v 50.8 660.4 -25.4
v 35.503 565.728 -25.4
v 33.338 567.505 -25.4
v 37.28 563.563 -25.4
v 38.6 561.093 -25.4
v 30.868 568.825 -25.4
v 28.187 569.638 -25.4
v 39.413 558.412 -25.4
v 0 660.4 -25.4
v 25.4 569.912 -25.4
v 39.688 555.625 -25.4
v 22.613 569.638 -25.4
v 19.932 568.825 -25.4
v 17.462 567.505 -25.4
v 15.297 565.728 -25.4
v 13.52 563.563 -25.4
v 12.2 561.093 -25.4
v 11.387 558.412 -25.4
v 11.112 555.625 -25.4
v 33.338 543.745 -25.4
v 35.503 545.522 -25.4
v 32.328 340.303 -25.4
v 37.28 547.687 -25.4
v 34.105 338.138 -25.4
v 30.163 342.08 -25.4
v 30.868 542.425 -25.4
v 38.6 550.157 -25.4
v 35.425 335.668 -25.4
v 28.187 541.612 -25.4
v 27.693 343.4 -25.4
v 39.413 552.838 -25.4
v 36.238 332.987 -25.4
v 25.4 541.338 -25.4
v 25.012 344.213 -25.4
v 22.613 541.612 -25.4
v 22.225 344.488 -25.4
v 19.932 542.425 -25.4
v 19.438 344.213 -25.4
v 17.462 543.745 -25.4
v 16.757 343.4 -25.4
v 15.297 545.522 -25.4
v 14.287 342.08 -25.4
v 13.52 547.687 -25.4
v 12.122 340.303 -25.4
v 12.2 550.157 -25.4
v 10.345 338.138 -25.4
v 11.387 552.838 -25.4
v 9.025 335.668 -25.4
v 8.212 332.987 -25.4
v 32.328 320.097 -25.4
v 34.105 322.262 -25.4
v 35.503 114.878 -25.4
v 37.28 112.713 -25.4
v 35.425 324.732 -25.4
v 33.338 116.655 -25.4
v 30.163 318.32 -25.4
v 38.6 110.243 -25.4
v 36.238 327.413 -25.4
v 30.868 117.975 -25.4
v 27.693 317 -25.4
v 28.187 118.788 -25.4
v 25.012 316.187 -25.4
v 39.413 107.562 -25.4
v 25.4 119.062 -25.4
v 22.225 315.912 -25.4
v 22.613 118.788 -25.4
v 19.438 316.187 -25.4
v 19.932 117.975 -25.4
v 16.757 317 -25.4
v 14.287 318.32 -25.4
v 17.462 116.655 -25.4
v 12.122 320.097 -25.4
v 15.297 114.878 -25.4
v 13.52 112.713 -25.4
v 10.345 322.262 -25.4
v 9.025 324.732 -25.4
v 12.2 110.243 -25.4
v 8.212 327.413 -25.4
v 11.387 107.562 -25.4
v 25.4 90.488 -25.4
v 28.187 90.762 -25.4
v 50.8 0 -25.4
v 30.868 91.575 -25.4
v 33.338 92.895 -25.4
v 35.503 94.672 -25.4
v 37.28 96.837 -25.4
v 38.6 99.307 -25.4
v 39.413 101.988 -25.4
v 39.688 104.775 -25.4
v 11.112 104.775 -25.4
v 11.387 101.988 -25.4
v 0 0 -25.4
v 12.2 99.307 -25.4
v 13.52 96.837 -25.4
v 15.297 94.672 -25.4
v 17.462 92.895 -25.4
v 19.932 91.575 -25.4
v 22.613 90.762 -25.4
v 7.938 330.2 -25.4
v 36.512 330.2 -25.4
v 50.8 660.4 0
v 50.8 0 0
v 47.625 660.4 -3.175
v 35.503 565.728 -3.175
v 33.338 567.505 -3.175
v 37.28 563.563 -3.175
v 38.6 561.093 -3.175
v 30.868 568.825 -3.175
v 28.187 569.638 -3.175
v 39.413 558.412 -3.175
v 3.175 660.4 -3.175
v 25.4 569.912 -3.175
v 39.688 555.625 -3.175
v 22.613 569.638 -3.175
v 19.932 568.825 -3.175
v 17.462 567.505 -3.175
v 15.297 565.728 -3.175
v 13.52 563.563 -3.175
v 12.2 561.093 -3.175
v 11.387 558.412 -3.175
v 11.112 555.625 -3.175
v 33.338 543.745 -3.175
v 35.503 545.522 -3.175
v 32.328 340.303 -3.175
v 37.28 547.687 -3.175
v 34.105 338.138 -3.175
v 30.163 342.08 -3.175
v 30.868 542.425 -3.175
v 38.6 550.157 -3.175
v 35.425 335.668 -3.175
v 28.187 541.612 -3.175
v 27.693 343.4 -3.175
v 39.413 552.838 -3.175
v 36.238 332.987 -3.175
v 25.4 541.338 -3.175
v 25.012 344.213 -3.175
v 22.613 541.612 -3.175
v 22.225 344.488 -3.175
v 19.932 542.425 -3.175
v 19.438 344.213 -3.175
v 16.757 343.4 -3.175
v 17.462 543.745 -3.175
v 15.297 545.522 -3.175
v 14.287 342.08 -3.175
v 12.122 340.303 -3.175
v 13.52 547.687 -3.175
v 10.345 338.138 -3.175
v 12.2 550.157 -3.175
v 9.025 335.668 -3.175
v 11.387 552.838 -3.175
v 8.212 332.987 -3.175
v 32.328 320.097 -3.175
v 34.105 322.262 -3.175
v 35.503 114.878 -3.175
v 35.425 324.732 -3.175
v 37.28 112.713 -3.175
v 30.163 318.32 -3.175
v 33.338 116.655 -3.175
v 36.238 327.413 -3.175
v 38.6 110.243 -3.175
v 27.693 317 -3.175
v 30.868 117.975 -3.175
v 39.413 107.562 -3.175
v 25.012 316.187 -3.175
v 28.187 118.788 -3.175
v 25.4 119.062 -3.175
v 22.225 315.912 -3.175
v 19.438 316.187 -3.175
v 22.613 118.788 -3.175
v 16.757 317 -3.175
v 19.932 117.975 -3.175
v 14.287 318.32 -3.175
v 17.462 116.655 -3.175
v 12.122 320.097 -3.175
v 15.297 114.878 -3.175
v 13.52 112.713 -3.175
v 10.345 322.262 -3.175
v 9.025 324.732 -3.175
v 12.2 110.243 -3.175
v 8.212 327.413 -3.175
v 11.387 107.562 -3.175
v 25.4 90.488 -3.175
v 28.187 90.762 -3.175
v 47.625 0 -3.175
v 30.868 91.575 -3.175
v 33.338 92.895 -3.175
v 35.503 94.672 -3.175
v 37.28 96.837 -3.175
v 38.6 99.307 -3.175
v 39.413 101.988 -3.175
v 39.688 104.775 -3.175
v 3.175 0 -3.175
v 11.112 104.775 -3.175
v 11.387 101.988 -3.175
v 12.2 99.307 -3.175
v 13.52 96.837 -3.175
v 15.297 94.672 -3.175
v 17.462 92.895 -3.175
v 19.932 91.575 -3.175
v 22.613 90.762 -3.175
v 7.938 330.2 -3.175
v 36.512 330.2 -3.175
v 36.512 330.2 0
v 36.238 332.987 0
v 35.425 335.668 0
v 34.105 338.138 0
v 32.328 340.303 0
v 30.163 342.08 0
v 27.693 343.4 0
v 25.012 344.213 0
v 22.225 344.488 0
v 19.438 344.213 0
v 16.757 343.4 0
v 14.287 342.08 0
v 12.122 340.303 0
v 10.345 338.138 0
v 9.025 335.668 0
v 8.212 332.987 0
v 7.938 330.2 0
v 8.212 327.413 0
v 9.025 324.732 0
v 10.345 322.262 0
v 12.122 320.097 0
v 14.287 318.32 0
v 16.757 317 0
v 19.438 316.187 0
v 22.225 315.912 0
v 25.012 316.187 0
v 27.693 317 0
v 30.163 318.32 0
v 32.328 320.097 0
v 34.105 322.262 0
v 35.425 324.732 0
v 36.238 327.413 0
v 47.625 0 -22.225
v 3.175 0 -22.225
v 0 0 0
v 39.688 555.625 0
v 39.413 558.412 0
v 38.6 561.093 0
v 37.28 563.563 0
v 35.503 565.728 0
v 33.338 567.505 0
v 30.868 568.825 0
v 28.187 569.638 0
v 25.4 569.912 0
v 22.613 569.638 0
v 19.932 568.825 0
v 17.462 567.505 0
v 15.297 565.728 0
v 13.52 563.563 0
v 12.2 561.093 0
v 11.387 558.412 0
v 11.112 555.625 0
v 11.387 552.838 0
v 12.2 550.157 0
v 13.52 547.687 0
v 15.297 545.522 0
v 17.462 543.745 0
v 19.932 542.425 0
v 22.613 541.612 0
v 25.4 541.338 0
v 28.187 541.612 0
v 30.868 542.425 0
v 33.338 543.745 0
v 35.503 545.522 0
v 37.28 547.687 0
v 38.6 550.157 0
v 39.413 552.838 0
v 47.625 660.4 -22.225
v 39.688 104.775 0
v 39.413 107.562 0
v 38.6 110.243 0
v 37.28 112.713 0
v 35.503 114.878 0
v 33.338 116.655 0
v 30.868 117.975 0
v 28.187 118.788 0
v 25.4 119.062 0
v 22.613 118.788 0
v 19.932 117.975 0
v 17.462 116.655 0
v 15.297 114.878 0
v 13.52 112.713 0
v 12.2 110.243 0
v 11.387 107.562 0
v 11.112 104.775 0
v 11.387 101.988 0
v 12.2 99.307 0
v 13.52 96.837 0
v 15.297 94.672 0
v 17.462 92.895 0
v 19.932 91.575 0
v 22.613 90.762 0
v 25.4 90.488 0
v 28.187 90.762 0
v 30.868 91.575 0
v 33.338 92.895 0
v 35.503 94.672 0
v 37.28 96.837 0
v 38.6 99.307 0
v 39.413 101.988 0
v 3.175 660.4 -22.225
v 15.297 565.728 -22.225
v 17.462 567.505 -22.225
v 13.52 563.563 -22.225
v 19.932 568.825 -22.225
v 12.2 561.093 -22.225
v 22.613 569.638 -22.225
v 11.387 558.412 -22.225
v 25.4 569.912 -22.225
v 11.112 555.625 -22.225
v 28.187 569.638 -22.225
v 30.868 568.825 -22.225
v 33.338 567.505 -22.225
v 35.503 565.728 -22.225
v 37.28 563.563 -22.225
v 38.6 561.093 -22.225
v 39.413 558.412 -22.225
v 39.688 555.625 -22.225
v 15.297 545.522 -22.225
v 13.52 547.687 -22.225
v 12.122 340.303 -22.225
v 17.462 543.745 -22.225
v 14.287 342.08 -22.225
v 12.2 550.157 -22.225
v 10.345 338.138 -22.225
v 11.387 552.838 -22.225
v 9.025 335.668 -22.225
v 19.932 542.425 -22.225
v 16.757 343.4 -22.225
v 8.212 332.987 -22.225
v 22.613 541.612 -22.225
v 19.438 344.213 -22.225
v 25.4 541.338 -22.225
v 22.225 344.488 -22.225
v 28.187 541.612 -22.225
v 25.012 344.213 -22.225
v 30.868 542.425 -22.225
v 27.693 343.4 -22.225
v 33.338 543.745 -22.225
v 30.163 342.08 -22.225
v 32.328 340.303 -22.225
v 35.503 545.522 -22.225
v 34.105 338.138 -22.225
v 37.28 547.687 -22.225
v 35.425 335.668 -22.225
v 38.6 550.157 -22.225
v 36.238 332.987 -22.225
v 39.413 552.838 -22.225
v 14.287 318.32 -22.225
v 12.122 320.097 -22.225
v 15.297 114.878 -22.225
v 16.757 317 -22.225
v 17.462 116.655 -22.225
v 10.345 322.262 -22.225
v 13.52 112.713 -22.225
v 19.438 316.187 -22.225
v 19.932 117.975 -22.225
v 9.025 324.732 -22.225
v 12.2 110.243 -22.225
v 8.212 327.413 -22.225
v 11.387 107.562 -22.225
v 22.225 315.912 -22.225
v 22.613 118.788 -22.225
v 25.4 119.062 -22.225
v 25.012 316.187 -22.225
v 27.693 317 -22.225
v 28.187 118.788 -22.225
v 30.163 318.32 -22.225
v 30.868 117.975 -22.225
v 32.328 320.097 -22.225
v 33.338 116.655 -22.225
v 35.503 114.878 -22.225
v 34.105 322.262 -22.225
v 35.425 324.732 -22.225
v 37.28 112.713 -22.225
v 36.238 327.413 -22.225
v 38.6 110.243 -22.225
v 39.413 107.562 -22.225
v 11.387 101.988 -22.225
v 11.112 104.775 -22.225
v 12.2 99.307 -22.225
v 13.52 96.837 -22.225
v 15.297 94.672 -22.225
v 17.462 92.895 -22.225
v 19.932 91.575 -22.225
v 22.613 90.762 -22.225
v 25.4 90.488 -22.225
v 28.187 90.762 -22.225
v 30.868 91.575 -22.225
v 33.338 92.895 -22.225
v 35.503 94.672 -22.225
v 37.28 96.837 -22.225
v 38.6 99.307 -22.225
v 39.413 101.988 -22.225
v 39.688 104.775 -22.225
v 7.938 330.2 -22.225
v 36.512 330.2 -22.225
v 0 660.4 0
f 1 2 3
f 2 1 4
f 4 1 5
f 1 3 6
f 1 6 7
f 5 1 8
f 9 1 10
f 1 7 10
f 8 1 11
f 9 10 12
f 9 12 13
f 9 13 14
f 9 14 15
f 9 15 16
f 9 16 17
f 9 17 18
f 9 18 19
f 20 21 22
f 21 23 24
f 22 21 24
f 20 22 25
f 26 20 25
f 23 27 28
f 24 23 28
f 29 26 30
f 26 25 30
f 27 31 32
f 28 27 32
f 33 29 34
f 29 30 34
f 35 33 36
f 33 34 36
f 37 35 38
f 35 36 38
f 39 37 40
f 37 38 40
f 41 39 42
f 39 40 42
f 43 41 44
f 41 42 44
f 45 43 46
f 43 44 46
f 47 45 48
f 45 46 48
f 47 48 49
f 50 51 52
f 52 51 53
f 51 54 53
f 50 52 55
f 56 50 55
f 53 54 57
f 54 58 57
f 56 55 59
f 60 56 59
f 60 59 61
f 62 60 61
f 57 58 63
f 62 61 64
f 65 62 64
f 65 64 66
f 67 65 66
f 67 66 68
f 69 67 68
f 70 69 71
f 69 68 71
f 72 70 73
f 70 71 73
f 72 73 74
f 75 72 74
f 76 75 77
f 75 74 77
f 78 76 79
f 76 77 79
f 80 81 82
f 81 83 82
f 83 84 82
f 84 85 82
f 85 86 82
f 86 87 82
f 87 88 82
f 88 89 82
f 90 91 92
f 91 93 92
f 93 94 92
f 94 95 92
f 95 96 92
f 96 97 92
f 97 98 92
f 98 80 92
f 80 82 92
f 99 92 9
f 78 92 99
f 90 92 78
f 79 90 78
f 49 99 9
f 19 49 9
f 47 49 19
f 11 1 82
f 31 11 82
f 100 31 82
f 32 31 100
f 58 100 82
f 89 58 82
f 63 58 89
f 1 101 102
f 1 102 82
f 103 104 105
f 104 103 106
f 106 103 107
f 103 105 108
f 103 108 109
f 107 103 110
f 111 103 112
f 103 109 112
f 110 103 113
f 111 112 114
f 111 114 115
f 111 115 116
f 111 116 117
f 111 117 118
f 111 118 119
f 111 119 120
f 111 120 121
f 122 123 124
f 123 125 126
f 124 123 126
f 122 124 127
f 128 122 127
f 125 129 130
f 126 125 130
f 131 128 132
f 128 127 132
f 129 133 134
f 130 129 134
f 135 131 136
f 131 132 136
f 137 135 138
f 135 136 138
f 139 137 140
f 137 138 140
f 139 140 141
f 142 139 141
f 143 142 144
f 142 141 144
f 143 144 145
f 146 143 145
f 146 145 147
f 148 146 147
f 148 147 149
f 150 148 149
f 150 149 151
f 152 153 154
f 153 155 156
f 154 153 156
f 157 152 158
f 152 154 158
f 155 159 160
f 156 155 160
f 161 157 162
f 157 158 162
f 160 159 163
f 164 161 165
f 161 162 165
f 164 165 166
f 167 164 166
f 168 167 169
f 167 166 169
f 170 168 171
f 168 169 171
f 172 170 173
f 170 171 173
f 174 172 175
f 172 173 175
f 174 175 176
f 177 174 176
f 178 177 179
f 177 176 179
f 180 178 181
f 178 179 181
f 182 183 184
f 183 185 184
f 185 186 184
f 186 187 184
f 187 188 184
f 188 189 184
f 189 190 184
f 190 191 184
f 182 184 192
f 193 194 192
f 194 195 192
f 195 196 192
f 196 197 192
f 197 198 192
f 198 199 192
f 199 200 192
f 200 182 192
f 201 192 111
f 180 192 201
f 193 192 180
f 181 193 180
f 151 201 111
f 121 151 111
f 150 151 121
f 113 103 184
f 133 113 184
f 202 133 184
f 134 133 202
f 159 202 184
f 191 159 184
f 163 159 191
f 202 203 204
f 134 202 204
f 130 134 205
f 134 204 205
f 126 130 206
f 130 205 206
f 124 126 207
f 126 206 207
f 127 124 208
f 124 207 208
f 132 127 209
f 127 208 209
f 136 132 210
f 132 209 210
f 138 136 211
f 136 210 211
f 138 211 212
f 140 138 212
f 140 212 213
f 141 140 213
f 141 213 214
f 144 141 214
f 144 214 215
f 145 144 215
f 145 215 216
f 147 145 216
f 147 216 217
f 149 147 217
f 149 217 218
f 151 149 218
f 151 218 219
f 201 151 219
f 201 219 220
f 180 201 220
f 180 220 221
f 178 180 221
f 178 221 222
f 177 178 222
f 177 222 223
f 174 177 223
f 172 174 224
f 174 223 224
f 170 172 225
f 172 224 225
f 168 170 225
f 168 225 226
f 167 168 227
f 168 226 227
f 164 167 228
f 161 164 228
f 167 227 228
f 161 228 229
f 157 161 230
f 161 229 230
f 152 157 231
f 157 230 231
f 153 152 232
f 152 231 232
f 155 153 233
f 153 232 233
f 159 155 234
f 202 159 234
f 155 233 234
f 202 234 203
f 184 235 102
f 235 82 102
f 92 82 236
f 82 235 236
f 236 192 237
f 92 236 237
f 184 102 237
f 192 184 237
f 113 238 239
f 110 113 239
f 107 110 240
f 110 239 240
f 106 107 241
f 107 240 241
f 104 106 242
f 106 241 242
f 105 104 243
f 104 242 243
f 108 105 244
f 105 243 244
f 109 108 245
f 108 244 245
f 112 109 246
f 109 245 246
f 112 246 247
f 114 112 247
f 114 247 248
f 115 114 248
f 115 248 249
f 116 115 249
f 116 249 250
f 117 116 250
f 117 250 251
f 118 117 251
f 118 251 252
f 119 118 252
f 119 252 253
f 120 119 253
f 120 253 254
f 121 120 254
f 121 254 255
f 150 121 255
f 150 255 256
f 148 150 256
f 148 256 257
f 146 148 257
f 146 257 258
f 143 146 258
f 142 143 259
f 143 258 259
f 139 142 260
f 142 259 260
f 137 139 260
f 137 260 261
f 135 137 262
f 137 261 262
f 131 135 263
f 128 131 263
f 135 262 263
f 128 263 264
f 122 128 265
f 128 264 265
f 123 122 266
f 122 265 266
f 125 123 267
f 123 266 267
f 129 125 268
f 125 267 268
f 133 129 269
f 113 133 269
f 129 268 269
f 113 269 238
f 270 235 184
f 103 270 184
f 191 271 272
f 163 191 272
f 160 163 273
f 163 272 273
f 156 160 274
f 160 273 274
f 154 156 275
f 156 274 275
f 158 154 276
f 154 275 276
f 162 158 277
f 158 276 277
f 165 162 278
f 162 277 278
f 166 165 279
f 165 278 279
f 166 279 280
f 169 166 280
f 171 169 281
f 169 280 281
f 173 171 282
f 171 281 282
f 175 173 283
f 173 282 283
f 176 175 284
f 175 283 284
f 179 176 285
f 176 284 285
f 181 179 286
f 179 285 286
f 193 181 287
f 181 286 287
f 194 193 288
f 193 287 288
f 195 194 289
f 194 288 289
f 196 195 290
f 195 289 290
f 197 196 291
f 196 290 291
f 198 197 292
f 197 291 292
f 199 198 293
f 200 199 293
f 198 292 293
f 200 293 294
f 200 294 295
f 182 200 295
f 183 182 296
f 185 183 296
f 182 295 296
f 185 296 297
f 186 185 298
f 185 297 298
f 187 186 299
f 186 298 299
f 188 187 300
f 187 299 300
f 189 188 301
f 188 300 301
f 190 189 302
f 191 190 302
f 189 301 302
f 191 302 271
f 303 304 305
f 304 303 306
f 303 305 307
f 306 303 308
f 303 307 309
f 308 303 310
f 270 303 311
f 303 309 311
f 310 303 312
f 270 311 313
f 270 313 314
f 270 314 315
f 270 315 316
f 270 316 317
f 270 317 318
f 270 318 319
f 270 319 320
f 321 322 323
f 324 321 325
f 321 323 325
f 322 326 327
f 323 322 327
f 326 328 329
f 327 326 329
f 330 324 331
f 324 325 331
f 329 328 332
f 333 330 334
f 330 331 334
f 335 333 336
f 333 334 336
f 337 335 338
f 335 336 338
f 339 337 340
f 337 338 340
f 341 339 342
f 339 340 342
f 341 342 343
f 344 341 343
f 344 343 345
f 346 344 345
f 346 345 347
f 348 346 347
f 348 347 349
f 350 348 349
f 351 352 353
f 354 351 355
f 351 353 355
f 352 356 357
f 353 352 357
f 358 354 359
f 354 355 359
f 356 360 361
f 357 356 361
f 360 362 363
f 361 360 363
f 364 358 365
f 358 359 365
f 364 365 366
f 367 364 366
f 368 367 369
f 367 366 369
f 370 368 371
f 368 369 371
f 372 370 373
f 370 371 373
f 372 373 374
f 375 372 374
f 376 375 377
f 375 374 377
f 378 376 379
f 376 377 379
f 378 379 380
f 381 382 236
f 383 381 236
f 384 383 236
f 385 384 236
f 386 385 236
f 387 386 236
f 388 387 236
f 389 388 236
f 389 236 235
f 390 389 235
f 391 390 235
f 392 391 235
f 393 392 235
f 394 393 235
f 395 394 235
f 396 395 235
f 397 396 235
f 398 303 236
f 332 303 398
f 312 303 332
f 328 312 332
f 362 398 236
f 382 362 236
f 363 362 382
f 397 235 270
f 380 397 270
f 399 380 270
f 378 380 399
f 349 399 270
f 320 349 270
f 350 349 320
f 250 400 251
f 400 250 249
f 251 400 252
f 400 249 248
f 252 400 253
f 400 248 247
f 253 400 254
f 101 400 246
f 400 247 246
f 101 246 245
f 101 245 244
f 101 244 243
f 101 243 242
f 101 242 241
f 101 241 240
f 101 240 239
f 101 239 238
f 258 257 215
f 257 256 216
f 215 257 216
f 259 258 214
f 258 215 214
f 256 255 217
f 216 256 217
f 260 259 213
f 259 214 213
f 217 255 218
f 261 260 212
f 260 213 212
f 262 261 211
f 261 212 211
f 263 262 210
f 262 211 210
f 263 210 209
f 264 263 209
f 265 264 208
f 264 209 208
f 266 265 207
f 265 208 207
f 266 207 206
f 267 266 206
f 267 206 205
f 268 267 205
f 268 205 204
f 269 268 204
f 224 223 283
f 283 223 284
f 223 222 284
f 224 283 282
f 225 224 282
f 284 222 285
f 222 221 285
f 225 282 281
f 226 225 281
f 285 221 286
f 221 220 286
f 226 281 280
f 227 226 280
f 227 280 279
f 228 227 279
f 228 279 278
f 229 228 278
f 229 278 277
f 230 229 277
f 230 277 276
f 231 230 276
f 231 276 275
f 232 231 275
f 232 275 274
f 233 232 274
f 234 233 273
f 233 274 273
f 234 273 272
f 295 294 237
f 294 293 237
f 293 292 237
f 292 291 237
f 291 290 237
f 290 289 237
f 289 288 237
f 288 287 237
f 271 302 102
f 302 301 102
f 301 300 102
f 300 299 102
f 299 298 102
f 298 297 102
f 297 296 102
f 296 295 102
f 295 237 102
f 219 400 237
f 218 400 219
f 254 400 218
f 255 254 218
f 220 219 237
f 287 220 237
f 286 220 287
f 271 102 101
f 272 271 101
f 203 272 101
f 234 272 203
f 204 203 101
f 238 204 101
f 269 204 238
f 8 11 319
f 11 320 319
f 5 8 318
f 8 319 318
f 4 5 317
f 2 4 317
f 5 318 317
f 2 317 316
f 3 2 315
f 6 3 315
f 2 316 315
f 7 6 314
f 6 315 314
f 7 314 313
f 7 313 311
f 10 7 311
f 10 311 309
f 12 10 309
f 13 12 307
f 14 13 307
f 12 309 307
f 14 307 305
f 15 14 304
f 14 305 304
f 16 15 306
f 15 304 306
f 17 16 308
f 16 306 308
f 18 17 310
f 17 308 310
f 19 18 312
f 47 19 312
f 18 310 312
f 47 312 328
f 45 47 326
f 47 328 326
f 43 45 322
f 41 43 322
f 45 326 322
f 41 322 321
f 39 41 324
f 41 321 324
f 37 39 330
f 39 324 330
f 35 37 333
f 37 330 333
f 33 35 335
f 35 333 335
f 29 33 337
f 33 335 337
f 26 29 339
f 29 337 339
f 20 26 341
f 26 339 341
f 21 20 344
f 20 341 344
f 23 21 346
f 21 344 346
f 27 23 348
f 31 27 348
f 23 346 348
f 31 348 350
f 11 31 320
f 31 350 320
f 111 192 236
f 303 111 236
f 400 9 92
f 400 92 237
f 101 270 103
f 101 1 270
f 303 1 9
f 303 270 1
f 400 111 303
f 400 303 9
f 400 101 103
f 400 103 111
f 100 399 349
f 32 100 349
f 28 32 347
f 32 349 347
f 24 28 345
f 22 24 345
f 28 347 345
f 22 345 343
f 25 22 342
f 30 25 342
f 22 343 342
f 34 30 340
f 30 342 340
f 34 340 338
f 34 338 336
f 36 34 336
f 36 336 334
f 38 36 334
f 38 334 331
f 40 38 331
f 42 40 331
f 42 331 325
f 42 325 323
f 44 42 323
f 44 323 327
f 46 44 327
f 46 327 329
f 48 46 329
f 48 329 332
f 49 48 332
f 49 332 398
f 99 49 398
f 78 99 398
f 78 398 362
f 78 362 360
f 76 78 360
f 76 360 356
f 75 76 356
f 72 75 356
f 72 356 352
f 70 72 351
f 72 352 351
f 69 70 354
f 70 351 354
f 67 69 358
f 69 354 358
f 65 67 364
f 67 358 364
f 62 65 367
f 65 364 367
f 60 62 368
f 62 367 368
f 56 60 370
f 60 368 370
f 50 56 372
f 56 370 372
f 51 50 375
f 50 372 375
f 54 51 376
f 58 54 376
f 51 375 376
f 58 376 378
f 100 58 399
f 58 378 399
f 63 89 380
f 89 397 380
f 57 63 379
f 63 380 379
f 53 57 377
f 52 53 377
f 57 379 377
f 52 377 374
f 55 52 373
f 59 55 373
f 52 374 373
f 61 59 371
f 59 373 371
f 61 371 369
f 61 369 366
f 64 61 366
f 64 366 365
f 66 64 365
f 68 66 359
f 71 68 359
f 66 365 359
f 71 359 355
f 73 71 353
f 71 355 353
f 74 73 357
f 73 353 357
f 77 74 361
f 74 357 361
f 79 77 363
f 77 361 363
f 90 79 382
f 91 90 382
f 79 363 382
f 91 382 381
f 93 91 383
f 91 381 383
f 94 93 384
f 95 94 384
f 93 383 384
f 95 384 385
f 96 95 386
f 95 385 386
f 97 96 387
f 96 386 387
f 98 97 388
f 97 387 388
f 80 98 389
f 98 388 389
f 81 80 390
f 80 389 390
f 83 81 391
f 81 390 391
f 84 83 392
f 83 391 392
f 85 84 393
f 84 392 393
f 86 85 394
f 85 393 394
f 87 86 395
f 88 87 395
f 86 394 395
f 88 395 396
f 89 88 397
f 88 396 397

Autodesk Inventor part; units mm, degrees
ref_plane "YZ Plane" through (0, 0, 0) normal (1, 0, 0) x (0, 1, 0)
ref_plane "XZ Plane" through (0, 0, 0) normal (0, 1, 0) x (-1, 0, 0)
ref_plane "XY Plane" through (0, 0, 0) normal (0, 0, 1) x (1, 0, 0)
sketch "Sketch1" plane through (0, 0, 0) normal (0, 1, 0) x (-1, 0, 0)
  line L0 (0, 0) -> (-50.8, 0)
  line L1 (-50.8, 0) -> (-50.8, -25.4)
  line L2 (-50.8, -25.4) -> (0, -25.4)
  line L3 (0, -25.4) -> (0, 0)
  line L4 (-3.175, -22.225) -> (-47.625, -22.225)
  line L5 (-47.625, -22.225) -> (-47.625, -3.175)
  line L6 (-47.625, -3.175) -> (-3.175, -3.175)
  line L7 (-3.175, -3.175) -> (-3.175, -22.225)
  dimension "d0" = 50.8
  dimension "d1" = 25.4
  dimension "d2" = 3.175
  dimension "d3" = 3.175
  dimension "d4" = 3.175
  dimension "d5" = 3.175
extrude "Extrusion1" add sketch "Sketch1" along normal blind 660.4
sketch "Sketch2" plane through (0, 0, 0) normal (0, 0, 1) x (1, 0, 0)
  line L0 (3.175, 660.4) -> (47.625, 660.4) projected
  line L1 (25.4, 660.4) -> (25.4, 0)
  line L2 (25.4, 0) -> (25.4, 330.2)
  line L3 (25.4, 330.2) -> (22.225, 330.2)
  circle A0 centre (22.225, 330.2) radius 14.2875
  point P0 (0, 0)
  dimension "d11" = 3.175
extrude "Extrusion2" cut sketch "Sketch2" against normal blind 25.4
sketch "Sketch3" plane through (0, 0, 0) normal (0, 0, 1) x (1, 0, 0)
  line L0 (0, 0) -> (50.8, 0) projected
  line L1 (25.4, 0) -> (25.4, 660.4)
  line L2 (0, 660.4) -> (50.8, 660.4) projected
  line L3 (25.4, 660.4) -> (25.4, 571.5)
  line L4 (25.4, 0) -> (25.4, 88.9)
  line L5 (25.4, 571.5) -> (25.4, 555.625)
  circle A0 centre (25.4, 555.625) radius 14.2875
  line L6 (25.4, 88.9) -> (25.4, 104.775)
  circle A1 centre (25.4, 104.775) radius 14.2875
  dimension "d12" = 88.9
  dimension "d13" = 88.9
  dimension "d17" = 15.875
  dimension "d18" = 15.875
extrude "Extrusion3" cut sketch "Sketch3" against normal blind 25.4
properties part number "26in 2x1" material "Aluminum 6061"
